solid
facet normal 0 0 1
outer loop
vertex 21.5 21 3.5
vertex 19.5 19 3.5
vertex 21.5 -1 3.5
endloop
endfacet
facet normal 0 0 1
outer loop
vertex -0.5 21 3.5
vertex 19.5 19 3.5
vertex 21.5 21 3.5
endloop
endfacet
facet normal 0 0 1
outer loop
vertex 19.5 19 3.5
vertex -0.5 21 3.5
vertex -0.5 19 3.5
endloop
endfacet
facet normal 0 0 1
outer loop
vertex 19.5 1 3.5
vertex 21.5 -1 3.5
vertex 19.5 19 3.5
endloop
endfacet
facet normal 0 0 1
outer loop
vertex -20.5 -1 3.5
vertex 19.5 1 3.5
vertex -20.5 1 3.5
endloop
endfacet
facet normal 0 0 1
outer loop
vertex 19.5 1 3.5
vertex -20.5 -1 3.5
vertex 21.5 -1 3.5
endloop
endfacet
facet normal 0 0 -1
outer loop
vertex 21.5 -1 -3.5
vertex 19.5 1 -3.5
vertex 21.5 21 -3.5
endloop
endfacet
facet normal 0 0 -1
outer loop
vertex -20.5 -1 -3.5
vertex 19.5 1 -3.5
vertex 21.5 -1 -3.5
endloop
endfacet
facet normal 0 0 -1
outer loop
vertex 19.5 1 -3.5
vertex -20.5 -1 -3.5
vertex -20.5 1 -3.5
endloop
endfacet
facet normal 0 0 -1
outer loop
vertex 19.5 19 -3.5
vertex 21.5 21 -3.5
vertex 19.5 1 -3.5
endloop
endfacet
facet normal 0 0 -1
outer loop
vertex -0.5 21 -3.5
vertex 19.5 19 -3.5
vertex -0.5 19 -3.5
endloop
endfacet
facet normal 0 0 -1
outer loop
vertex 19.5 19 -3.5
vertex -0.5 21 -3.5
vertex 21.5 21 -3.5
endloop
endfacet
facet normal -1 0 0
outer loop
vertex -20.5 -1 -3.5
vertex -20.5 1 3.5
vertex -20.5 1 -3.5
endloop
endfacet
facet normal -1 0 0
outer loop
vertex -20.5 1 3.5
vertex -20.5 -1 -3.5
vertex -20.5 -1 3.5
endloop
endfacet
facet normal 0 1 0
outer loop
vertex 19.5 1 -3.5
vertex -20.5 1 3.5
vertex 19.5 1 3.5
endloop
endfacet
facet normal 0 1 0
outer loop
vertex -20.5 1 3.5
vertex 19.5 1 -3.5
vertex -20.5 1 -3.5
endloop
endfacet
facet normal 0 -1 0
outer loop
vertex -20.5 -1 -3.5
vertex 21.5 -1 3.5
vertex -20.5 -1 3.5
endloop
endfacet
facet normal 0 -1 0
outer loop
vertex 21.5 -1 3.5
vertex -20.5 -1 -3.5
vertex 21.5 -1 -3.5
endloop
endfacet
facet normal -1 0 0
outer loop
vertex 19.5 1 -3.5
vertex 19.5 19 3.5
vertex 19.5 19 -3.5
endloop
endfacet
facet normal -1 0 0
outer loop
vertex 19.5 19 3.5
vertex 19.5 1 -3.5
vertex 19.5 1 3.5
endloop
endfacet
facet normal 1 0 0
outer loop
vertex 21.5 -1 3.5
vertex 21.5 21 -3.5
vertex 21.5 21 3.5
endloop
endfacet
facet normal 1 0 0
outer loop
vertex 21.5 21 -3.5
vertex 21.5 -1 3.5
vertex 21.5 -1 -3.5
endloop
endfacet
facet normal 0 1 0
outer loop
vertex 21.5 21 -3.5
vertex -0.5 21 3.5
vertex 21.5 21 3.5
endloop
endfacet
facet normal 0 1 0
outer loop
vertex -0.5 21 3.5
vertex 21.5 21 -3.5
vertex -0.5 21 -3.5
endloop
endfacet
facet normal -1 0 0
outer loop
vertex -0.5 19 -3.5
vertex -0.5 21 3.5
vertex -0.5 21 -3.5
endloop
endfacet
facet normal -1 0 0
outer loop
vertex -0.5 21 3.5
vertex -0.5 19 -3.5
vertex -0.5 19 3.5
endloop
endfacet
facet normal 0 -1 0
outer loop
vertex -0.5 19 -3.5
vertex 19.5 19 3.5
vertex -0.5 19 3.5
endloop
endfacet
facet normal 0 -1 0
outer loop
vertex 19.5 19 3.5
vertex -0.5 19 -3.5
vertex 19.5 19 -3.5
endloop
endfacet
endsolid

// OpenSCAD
// Small wall for 4 well plate lid to make arena for OMR
// Created by Juan Angueyra (angueyra@nih.gov)
// November 2019

// in mm
wall_h = 7;
wall_t = 2;

// main call
3Dprintflag=1;
wall_tr = 3Dprintflag ? [0,0,0] : [0,0,0];
wall_rot = 3Dprintflag ? [0,0,0] : [0,0,0];


translate(wall_tr){rotate(wall_rot){wall();}}


// modules
module wall() {
	cube(size=[41, wall_t, wall_h], center=true);
	translate([41/2, (20/2), 0]) {
		rotate([0, 0, 90]) {
			cube(size=[20+wall_t, wall_t, wall_h], center=true);
		}
	}
	translate([(41-20)/2, (20), 0]) {
		rotate([0, 0, 0]) {
			cube(size=[20+wall_t, wall_t, wall_h], center=true);
		}
	}
}



module trapezoid(width_base, width_top,height,thickness) {
	translate([height/2,-width_base/2,thickness/2]) {rotate([0,0,90]) {
  		linear_extrude(height = thickness) polygon(points=[[0,0],[width_base,0],[width_base-(width_base-width_top)/2,height],[(width_base-width_top)/2,height]], paths=[[0,1,2,3]]);  
	}}
}
